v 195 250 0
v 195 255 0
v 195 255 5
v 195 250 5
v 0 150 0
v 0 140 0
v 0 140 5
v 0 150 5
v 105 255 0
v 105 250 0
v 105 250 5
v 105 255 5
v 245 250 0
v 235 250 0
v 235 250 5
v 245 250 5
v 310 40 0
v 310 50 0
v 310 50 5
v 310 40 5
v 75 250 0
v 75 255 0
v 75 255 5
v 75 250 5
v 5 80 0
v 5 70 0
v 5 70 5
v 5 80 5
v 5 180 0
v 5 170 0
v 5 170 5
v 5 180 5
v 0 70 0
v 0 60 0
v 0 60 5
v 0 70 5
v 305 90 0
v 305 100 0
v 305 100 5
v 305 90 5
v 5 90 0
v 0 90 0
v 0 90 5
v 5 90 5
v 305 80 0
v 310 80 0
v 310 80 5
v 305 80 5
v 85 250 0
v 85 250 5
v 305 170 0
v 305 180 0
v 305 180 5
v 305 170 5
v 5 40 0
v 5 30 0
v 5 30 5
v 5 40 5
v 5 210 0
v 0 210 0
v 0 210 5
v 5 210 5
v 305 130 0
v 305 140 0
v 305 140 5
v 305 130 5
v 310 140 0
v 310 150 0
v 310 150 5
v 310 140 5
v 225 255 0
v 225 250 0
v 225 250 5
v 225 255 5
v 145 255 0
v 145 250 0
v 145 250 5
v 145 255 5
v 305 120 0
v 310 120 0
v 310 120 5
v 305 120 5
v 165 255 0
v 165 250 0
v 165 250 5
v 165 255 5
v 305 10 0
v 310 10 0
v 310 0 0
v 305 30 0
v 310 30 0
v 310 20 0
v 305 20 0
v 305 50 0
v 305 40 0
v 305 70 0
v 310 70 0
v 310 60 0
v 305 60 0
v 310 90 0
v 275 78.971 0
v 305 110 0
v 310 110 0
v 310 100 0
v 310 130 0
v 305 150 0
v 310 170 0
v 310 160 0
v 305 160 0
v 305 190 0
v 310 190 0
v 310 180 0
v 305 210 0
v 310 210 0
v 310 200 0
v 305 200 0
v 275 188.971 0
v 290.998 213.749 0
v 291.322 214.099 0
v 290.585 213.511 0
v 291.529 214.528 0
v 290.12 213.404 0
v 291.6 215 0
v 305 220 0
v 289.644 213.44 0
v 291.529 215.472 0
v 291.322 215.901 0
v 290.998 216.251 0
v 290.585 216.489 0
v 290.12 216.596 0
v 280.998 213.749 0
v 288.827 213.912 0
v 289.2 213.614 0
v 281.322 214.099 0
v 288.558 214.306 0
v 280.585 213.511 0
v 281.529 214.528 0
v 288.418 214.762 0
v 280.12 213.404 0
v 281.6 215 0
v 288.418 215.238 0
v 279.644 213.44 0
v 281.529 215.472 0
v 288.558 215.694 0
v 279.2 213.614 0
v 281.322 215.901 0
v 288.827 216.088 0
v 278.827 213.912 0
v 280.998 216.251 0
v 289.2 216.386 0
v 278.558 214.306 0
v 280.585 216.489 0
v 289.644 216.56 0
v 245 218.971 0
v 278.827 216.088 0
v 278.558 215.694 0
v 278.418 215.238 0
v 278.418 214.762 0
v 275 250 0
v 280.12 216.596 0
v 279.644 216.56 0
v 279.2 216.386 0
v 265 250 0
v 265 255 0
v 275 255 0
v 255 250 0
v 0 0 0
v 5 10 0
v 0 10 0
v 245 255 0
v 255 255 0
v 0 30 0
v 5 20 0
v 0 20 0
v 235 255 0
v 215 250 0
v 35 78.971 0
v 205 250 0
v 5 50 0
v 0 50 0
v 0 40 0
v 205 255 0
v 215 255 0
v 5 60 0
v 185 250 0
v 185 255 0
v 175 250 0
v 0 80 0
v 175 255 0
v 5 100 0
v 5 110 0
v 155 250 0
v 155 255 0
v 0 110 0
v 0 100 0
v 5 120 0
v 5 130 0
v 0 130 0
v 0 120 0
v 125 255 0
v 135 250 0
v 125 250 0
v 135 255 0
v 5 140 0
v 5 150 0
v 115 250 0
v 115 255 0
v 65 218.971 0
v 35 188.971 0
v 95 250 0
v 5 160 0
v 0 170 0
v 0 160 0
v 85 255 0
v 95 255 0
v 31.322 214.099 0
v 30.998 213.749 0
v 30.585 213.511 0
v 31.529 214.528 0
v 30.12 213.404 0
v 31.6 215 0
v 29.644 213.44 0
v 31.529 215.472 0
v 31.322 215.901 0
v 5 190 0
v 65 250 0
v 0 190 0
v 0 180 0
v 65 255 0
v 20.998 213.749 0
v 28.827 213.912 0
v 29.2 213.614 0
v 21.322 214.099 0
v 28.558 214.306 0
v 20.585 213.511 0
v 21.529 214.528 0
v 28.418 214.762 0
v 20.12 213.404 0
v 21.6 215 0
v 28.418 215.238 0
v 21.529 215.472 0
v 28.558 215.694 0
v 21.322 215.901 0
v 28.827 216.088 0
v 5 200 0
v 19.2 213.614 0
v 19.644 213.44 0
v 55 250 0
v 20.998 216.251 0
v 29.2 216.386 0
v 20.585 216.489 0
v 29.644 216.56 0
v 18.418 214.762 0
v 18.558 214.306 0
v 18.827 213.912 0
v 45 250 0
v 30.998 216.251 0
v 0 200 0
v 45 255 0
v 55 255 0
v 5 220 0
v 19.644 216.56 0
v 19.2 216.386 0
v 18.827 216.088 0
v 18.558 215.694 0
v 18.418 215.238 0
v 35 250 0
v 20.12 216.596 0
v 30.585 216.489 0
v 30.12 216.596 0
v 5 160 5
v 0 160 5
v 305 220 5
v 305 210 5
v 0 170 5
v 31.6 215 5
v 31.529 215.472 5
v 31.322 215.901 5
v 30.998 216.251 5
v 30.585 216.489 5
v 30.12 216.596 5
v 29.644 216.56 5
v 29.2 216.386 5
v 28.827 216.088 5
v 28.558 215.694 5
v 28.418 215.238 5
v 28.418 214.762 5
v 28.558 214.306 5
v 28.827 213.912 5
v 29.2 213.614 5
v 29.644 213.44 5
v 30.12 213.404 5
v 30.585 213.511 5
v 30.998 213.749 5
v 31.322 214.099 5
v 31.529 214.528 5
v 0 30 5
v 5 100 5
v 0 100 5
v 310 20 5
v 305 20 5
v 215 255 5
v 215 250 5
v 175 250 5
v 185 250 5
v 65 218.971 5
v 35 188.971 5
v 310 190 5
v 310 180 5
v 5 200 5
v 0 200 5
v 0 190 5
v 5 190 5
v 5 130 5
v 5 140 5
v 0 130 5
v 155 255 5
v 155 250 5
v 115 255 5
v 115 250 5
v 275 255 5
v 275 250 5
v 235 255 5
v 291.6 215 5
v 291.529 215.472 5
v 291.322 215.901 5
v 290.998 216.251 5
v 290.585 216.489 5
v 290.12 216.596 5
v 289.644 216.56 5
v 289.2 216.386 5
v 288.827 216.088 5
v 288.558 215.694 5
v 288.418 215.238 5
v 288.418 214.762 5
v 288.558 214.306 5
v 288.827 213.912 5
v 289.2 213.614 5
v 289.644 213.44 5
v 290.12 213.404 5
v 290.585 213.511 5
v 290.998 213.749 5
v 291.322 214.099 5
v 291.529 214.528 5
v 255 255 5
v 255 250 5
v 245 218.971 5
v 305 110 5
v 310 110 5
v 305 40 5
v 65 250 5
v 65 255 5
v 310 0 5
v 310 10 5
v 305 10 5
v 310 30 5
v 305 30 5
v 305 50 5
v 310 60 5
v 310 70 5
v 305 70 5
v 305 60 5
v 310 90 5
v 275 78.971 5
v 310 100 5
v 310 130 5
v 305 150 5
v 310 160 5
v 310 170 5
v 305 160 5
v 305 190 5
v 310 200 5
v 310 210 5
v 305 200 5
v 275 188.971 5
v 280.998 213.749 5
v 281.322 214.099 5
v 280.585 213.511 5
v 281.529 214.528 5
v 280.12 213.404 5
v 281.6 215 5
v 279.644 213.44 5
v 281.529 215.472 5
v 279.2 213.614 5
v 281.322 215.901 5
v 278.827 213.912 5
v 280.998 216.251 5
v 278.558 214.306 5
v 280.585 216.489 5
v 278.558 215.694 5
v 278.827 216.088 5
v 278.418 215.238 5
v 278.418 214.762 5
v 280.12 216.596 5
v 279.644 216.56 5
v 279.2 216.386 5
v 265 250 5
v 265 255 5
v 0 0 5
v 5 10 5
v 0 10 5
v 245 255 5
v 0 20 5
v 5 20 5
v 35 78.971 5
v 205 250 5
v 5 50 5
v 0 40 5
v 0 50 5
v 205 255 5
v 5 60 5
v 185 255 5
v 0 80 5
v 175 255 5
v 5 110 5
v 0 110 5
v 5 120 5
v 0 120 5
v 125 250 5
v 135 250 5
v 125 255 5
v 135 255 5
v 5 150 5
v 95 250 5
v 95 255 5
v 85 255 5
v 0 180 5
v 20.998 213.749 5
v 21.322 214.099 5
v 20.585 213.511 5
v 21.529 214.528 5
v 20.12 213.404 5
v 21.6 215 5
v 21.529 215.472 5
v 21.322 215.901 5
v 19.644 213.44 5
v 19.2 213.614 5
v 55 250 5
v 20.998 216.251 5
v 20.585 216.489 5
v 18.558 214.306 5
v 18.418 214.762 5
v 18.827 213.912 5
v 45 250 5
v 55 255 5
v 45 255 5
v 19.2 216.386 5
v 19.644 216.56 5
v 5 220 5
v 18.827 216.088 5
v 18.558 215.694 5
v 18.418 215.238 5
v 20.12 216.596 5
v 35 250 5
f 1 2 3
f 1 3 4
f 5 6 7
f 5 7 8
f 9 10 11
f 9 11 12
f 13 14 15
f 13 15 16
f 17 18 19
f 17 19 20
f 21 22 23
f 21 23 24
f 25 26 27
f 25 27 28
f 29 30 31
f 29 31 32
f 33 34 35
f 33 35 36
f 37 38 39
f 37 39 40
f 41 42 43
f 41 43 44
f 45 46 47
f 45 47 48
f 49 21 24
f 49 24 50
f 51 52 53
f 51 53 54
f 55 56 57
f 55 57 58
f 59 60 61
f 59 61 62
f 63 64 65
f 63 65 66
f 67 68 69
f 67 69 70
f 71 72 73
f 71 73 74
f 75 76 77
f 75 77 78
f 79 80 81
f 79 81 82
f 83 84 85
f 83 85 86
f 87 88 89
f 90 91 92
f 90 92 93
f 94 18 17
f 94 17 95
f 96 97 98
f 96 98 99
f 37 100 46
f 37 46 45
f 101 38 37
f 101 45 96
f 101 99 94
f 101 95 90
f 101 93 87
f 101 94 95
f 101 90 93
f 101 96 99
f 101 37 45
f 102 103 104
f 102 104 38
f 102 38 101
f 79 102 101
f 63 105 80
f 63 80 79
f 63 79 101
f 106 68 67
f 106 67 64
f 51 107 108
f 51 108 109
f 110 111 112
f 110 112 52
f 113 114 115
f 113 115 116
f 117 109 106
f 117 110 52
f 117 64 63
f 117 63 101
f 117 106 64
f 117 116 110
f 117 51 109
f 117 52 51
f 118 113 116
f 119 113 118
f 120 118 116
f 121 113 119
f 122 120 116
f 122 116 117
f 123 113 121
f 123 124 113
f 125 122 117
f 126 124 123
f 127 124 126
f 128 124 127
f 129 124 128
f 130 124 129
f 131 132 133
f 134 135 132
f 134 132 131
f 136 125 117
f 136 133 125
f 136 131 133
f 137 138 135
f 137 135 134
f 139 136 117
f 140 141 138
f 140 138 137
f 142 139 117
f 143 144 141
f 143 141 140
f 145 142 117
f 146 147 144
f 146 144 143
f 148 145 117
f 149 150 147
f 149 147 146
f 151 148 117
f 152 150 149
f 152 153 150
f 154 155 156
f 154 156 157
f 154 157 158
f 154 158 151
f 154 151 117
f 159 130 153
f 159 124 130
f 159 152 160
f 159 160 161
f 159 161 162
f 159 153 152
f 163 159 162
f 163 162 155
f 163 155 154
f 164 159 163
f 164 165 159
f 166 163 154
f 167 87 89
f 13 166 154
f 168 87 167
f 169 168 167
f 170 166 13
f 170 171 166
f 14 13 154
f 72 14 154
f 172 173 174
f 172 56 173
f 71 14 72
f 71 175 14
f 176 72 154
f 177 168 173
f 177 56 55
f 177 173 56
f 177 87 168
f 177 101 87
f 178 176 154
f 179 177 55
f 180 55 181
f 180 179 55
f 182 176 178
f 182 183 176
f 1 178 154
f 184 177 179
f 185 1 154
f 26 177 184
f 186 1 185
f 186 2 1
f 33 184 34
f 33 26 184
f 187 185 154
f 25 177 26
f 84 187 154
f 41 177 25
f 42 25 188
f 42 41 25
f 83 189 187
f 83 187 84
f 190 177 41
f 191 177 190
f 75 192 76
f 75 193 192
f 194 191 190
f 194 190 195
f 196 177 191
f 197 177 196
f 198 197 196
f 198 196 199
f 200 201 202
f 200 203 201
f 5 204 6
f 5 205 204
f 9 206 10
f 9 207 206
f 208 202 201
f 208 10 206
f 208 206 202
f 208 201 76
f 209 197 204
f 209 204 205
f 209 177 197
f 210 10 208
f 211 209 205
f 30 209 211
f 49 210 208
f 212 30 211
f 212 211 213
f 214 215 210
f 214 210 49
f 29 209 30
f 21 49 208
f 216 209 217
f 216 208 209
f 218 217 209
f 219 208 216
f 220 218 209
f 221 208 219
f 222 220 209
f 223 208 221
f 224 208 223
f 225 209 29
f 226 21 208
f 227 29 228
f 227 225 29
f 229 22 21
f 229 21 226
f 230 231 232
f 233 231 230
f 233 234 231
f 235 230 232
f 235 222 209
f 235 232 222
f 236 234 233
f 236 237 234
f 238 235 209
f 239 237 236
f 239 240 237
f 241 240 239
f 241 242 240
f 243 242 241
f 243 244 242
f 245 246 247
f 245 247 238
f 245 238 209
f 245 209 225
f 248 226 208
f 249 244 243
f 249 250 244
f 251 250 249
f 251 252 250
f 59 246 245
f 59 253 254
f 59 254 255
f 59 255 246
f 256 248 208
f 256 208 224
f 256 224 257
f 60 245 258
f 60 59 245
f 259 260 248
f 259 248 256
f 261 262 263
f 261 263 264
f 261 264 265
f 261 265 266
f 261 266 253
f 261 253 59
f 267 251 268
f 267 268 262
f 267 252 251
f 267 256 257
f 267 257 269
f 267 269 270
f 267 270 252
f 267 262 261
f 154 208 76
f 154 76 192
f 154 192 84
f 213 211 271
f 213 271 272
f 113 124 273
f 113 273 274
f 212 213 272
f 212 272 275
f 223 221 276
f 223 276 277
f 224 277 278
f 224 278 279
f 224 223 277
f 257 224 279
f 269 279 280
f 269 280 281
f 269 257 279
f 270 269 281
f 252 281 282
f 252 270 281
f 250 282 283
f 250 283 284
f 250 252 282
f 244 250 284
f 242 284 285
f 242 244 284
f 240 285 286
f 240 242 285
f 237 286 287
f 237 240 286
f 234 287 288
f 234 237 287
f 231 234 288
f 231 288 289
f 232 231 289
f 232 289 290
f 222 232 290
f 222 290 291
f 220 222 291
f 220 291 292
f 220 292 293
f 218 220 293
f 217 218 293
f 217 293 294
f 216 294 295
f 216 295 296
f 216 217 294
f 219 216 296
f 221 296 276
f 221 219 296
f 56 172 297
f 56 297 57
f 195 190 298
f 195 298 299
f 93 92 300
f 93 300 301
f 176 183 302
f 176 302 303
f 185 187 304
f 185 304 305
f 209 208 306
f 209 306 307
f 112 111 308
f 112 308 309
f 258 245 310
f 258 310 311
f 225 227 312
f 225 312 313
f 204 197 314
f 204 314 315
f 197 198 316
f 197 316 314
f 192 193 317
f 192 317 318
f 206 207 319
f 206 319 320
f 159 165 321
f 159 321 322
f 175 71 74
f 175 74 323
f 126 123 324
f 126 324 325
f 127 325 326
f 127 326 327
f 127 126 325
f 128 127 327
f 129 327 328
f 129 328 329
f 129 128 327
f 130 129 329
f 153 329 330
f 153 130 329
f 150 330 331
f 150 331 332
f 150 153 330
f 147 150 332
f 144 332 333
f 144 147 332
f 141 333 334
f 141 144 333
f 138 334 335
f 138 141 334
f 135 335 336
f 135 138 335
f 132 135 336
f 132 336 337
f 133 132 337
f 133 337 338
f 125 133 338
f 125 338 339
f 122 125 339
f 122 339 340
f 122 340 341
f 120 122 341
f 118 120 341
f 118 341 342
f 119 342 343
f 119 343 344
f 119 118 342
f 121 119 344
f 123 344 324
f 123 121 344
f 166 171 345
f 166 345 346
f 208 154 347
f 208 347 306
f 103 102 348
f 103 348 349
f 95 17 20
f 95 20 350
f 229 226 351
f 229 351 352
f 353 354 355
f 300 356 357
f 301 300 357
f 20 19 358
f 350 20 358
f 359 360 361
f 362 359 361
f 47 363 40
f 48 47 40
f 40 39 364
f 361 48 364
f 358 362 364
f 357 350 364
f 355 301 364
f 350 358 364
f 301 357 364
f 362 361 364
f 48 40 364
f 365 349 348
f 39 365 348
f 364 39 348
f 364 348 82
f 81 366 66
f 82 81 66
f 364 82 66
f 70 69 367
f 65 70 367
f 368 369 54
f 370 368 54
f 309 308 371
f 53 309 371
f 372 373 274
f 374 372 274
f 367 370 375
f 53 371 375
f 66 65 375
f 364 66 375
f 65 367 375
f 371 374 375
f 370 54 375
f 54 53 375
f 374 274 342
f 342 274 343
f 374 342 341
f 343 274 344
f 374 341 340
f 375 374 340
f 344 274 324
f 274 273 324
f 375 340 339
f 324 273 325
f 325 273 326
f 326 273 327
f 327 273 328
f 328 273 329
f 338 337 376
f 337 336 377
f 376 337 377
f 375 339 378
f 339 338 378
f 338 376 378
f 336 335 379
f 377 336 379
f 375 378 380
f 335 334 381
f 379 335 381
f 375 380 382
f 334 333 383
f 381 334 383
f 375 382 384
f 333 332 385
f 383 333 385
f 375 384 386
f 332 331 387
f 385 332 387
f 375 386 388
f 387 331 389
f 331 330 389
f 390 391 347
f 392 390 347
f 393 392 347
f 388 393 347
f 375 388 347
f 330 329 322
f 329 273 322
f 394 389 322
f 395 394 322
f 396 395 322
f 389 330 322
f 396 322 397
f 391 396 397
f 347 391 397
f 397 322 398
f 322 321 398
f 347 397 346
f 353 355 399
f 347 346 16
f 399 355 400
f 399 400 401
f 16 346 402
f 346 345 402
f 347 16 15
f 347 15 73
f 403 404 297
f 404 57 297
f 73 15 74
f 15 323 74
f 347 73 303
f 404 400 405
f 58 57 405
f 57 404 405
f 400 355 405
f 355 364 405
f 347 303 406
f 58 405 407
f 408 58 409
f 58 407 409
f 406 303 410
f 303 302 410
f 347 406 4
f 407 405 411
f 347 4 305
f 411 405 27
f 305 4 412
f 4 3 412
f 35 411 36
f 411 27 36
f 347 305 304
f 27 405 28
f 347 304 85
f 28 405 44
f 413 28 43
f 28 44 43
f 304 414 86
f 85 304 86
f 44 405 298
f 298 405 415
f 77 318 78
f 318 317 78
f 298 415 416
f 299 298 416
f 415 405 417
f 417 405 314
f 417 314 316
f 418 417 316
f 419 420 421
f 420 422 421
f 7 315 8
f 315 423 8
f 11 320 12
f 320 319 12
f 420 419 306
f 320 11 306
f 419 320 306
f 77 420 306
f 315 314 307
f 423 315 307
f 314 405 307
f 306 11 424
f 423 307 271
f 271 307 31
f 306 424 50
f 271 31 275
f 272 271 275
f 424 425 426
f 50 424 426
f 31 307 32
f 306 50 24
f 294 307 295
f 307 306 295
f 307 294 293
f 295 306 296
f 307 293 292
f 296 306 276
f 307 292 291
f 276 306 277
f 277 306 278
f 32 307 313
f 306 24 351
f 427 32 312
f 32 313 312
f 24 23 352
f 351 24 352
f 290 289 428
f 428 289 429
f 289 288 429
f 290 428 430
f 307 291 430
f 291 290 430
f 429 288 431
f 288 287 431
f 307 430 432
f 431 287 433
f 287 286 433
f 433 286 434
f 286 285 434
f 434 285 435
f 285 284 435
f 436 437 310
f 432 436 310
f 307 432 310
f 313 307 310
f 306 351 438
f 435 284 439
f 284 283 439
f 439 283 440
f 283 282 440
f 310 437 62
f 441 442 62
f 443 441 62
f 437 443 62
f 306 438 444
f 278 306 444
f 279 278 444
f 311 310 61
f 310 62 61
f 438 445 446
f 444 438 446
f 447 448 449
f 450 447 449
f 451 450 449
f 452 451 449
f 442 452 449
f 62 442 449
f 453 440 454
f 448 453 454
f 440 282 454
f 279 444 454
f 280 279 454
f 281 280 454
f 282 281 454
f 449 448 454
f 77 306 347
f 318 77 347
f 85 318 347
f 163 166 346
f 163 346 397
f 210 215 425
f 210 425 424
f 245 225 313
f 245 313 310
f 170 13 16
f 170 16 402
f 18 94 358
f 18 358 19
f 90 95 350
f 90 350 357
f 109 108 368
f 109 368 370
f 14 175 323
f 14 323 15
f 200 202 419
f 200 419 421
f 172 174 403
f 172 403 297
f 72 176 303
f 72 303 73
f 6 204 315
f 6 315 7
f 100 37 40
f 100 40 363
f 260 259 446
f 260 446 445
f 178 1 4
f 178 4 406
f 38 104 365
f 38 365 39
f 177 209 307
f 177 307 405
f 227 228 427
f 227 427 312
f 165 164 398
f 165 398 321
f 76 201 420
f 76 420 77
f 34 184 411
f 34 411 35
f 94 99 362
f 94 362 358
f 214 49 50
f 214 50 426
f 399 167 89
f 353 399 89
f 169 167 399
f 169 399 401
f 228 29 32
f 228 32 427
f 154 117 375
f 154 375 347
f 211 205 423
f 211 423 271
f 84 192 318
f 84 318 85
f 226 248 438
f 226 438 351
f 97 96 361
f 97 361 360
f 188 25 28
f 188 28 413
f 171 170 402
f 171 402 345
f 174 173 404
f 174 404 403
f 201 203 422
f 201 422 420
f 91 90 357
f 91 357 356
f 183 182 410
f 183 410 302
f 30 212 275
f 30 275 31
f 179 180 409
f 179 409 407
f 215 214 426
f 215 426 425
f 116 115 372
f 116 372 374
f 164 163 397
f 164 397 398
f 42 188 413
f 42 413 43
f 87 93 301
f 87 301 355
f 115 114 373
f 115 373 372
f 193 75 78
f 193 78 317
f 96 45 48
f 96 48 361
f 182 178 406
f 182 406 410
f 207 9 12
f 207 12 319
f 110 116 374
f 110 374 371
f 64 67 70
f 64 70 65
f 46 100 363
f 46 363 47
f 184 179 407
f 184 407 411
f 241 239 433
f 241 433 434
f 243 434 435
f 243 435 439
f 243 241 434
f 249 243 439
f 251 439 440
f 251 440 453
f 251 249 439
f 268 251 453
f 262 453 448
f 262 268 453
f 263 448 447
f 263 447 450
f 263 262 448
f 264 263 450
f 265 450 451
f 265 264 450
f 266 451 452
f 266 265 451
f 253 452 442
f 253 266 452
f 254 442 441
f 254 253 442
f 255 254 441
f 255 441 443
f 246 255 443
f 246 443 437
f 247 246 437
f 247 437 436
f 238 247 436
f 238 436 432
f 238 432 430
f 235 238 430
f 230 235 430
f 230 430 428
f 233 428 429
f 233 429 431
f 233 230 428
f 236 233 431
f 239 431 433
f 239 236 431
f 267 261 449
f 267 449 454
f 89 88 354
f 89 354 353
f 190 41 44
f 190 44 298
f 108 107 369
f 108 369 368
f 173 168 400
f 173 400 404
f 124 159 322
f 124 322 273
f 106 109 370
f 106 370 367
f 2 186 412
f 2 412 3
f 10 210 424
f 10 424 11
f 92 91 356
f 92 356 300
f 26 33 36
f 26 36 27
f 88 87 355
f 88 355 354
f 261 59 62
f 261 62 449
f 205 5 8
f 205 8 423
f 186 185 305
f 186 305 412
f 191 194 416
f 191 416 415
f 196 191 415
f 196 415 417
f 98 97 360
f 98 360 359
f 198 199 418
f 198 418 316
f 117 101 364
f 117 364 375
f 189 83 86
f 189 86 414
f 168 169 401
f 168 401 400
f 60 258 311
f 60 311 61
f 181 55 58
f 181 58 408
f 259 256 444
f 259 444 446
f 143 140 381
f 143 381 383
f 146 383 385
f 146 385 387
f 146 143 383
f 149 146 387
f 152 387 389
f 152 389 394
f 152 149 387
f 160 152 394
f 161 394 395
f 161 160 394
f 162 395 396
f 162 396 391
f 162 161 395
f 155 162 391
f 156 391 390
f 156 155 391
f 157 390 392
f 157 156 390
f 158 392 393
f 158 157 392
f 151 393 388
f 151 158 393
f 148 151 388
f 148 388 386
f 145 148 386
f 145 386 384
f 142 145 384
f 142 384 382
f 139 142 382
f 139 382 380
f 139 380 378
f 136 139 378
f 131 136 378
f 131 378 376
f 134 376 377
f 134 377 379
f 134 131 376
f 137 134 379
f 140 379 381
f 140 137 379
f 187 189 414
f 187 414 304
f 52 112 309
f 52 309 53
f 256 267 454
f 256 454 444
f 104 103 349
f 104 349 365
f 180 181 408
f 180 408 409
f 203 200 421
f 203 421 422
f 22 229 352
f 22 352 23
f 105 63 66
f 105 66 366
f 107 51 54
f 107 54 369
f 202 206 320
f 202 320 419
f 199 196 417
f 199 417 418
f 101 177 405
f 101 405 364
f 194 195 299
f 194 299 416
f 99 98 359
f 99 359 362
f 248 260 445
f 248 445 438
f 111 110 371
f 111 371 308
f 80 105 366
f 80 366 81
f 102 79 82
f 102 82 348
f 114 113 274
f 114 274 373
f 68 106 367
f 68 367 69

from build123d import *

# Parameters (mm, degrees)
SKIZZE1_R                       = 1.6
AUFSATZ_LINEAR_AUSTRAGEN1_DEPTH = 5


with BuildPart() as part:
    # Skizze1 → Aufsatz-Linear austragen1 (new body)
    with BuildSketch(Plane.XY):
        Polygon((5, 10), (5, 20), (0, 20), (0, 30), (5, 30), (5, 40), (0, 40), (0, 50), (5, 50), (5, 60), (0, 60), (0, 70), (5, 70), (5, 80), (0, 80), (0, 90), (5, 90), (5, 100), (0, 100), (0, 110), (5, 110), (5, 120), (0, 120), (0, 130), (5, 130), (5, 140), (0, 140), (0, 150), (5, 150), (5, 160), (0, 160), (0, 170), (5, 170), (5, 180), (0, 180), (0, 190), (5, 190), (5, 200), (0, 200), (0, 210), (5, 210), (5, 220), (35, 250), (45, 250), (45, 255), (55, 255), (55, 250), (65, 250), (65, 255), (75, 255), (75, 250), (85, 250), (85, 255), (95, 255), (95, 250), (105, 250), (105, 255), (115, 255), (115, 250), (125, 250), (125, 255), (135, 255), (135, 250), (145, 250), (145, 255), (155, 255), (155, 250), (165, 250), (165, 255), (175, 255), (175, 250), (185, 250), (185, 255), (195, 255), (195, 250), (205, 250), (205, 255), (215, 255), (215, 250), (225, 250), (225, 255), (235, 255), (235, 250), (245, 250), (245, 255), (255, 255), (255, 250), (265, 250), (265, 255), (275, 255), (275, 250), (305, 220), (305, 210), (310, 210), (310, 200), (305, 200), (305, 190), (310, 190), (310, 180), (305, 180), (305, 170), (310, 170), (310, 160), (305, 160), (305, 150), (310, 150), (310, 140), (305, 140), (305, 130), (310, 130), (310, 120), (305, 120), (305, 110), (310, 110), (310, 100), (305, 100), (305, 90), (310, 90), (310, 80), (305, 80), (305, 70), (310, 70), (310, 60), (305, 60), (305, 50), (310, 50), (310, 40), (305, 40), (305, 30), (310, 30), (310, 20), (305, 20), (305, 10), (310, 10), (310, 0), (305, 0), (5, 0), (0, 0), (0, 10), align=None)
        with Locations((290, 214.999999999)):
            Circle(SKIZZE1_R, mode=Mode.SUBTRACT)
        with Locations((280, 214.999999999)):
            Circle(SKIZZE1_R, mode=Mode.SUBTRACT)
        with Locations((20, 215)):
            Circle(SKIZZE1_R, mode=Mode.SUBTRACT)
        with Locations((30, 215)):
            Circle(SKIZZE1_R, mode=Mode.SUBTRACT)
        Polygon((275, 188.971165398), (245, 218.971165398), (65, 218.971165398), (35, 188.971165398), (35, 78.971165398), (275, 78.971165398), align=None, mode=Mode.SUBTRACT)
    extrude(amount=AUFSATZ_LINEAR_AUSTRAGEN1_DEPTH)


solid = part.part
